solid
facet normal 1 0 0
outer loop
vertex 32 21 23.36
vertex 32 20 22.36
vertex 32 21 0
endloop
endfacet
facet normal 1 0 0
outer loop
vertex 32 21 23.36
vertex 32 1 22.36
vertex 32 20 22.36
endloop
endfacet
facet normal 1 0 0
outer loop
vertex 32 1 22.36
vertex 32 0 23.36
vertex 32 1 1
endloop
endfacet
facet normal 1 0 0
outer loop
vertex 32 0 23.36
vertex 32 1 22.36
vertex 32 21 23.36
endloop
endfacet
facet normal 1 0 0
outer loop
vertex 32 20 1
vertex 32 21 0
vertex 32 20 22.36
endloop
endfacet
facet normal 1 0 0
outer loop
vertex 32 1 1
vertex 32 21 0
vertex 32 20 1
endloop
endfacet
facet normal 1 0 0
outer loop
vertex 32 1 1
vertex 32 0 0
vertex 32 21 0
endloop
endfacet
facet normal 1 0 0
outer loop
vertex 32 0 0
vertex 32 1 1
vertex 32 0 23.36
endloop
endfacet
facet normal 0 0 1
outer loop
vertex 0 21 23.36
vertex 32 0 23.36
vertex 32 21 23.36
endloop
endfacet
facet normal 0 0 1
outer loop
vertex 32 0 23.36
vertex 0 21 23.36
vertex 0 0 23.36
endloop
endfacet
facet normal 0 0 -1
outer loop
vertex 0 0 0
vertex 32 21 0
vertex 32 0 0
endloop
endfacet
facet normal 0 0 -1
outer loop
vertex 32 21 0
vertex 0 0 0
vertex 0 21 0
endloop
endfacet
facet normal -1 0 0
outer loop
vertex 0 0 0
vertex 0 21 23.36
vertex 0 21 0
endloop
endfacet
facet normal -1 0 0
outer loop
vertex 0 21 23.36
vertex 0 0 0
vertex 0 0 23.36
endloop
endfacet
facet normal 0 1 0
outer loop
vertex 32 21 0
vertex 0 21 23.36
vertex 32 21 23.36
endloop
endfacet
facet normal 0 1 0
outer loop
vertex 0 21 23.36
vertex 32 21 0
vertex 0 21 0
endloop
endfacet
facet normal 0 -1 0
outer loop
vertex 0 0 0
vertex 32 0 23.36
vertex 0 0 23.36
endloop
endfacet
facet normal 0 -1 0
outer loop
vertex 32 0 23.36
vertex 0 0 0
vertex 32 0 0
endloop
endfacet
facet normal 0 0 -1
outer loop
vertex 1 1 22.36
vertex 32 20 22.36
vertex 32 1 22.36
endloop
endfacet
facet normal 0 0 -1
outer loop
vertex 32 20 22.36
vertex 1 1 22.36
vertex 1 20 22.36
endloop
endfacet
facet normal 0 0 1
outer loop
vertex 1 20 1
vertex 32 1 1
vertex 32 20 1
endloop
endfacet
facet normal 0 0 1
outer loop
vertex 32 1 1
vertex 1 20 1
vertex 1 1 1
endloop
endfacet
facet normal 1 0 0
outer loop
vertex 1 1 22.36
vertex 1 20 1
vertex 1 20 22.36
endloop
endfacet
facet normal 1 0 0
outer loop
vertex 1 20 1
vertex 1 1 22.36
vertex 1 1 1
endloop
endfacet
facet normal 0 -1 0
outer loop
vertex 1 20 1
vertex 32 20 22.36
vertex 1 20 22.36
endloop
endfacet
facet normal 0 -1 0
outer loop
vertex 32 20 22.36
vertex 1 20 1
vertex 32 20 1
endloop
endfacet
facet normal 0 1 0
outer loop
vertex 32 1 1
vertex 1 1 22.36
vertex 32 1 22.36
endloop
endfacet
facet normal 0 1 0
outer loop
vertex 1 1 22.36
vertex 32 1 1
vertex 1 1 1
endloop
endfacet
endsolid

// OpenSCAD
//31 mm
//19 mm wide
//21.36 top to bottom
l=31;
w=19;
h=21.36;
thickness=1;
difference() {
    cube([l+thickness*1, w+thickness*2, h+thickness*2]);
    translate([thickness, thickness, thickness]) cube([l+thickness, w, h]);
}
